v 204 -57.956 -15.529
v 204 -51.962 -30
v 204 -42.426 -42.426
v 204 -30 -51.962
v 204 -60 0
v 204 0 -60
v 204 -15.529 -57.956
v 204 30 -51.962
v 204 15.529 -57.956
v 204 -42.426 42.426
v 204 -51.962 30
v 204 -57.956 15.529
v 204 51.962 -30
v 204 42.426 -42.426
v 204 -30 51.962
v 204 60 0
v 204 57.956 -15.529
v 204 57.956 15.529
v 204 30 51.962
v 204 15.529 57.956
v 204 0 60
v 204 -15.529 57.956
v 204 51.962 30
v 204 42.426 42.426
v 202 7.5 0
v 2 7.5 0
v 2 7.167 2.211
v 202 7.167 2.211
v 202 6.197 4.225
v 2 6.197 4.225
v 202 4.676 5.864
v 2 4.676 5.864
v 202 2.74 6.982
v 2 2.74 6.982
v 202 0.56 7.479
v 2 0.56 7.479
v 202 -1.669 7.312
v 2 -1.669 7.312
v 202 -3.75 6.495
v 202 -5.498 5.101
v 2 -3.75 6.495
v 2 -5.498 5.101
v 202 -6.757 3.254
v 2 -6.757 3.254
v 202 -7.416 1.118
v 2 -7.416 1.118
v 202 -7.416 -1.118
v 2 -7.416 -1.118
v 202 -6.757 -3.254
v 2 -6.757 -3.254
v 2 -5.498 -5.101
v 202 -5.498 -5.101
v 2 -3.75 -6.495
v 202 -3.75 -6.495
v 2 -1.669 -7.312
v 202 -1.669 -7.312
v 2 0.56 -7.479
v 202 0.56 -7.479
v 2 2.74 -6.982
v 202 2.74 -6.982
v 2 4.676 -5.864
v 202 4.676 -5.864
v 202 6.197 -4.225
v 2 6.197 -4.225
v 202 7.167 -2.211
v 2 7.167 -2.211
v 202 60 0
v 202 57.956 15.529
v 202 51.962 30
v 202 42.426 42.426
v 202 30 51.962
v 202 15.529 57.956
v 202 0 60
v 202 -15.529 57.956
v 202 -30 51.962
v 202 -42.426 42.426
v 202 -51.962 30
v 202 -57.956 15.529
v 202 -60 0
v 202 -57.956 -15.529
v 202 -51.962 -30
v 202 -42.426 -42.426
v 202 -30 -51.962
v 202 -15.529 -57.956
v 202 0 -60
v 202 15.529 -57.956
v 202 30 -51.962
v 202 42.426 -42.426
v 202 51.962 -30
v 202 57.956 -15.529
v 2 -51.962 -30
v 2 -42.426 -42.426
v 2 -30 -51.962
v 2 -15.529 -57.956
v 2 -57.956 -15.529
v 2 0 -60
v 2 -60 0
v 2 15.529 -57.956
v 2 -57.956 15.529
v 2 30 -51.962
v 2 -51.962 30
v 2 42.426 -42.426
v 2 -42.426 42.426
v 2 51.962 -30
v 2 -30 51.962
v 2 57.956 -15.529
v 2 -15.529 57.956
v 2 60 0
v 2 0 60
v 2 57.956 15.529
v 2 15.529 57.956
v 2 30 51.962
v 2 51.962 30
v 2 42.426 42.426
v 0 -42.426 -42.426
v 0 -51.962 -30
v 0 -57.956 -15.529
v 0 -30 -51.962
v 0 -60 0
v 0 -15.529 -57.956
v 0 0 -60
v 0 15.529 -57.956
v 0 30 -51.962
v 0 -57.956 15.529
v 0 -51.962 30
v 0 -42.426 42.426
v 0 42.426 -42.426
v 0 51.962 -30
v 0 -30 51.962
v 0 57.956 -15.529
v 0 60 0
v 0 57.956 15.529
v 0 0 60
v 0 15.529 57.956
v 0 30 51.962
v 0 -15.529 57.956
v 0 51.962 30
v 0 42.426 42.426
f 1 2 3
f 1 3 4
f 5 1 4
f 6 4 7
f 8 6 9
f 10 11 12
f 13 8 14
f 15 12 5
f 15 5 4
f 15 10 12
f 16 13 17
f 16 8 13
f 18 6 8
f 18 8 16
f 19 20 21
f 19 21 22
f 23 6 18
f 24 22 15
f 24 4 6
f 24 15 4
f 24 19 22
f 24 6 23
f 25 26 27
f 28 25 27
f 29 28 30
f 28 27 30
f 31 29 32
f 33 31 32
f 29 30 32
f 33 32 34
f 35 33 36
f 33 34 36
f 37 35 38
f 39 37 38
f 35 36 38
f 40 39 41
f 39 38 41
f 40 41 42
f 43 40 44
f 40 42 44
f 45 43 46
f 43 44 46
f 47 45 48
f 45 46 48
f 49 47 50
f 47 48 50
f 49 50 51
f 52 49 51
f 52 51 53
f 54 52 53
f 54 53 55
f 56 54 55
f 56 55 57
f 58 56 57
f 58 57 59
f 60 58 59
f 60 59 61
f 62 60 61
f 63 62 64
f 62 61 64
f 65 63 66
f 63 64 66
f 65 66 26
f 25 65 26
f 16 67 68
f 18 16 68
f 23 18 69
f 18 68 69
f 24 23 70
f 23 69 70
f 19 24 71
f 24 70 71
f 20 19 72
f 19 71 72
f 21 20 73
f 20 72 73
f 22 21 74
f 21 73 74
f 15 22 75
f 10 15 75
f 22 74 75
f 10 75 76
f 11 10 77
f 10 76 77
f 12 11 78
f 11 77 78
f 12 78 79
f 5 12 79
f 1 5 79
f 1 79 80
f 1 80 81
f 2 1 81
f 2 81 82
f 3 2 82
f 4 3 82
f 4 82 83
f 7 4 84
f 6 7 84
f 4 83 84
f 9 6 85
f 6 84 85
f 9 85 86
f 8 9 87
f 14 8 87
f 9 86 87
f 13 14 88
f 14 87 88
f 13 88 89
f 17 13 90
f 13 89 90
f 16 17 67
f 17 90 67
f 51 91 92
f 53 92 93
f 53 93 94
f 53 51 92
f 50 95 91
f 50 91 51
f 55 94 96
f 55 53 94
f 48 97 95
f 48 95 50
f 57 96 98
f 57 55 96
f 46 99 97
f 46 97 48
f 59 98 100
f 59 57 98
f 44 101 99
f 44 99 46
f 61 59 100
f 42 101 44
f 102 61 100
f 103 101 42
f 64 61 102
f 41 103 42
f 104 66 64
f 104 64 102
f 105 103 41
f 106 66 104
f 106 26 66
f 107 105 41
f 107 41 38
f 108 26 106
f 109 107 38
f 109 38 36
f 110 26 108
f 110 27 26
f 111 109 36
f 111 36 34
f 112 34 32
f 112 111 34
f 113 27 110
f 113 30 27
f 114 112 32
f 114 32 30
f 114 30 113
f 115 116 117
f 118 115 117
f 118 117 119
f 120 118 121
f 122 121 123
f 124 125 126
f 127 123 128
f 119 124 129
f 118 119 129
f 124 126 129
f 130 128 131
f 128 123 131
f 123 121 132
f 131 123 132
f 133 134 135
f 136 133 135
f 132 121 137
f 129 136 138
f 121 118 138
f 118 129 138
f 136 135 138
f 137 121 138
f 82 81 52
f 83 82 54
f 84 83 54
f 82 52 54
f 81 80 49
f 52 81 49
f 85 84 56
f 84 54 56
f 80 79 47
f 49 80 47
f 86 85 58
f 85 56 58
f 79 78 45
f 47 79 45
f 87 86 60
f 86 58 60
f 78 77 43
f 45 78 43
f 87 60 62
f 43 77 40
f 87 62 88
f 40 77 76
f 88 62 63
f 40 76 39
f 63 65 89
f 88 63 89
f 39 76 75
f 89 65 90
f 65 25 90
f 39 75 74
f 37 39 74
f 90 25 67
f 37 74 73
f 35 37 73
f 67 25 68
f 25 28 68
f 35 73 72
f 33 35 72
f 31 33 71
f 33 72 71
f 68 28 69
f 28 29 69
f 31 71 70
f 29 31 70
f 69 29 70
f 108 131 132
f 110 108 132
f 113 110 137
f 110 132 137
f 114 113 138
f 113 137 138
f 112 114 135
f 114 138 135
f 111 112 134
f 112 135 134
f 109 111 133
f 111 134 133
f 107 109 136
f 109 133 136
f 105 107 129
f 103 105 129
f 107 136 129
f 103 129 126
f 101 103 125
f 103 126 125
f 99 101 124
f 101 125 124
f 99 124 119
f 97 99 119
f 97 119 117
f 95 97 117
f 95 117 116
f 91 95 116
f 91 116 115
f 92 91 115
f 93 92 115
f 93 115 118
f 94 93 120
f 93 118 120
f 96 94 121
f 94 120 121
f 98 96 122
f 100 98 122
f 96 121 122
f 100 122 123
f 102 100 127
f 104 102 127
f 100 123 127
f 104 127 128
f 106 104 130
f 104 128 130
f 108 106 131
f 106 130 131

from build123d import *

# Parameters (mm, degrees)
F0_R     = 60
F0_R_2   = 7.5
F1_DEPTH = 2
F2_R     = 7.5
F3_DEPTH = 200
F5_R     = 60
F6_DEPTH = 2


with BuildPart() as f1:
    # F0 (on Right) → F1 (new body)
    with BuildSketch(Plane.YZ):
        Circle(F0_R)
        Circle(F0_R_2, mode=Mode.SUBTRACT)
        Circle(F0_R_2)
    extrude(amount=F1_DEPTH)

    # F2 (on face) → F3 (join)
    with BuildSketch(Plane.YZ.offset(2)):
        Circle(F2_R)
    extrude(amount=F3_DEPTH)

    # F5 (on face) → F6 (join)
    with BuildSketch(Plane.YZ.offset(202)):
        Circle(F5_R)
    extrude(amount=F6_DEPTH)


solid = f1.part
